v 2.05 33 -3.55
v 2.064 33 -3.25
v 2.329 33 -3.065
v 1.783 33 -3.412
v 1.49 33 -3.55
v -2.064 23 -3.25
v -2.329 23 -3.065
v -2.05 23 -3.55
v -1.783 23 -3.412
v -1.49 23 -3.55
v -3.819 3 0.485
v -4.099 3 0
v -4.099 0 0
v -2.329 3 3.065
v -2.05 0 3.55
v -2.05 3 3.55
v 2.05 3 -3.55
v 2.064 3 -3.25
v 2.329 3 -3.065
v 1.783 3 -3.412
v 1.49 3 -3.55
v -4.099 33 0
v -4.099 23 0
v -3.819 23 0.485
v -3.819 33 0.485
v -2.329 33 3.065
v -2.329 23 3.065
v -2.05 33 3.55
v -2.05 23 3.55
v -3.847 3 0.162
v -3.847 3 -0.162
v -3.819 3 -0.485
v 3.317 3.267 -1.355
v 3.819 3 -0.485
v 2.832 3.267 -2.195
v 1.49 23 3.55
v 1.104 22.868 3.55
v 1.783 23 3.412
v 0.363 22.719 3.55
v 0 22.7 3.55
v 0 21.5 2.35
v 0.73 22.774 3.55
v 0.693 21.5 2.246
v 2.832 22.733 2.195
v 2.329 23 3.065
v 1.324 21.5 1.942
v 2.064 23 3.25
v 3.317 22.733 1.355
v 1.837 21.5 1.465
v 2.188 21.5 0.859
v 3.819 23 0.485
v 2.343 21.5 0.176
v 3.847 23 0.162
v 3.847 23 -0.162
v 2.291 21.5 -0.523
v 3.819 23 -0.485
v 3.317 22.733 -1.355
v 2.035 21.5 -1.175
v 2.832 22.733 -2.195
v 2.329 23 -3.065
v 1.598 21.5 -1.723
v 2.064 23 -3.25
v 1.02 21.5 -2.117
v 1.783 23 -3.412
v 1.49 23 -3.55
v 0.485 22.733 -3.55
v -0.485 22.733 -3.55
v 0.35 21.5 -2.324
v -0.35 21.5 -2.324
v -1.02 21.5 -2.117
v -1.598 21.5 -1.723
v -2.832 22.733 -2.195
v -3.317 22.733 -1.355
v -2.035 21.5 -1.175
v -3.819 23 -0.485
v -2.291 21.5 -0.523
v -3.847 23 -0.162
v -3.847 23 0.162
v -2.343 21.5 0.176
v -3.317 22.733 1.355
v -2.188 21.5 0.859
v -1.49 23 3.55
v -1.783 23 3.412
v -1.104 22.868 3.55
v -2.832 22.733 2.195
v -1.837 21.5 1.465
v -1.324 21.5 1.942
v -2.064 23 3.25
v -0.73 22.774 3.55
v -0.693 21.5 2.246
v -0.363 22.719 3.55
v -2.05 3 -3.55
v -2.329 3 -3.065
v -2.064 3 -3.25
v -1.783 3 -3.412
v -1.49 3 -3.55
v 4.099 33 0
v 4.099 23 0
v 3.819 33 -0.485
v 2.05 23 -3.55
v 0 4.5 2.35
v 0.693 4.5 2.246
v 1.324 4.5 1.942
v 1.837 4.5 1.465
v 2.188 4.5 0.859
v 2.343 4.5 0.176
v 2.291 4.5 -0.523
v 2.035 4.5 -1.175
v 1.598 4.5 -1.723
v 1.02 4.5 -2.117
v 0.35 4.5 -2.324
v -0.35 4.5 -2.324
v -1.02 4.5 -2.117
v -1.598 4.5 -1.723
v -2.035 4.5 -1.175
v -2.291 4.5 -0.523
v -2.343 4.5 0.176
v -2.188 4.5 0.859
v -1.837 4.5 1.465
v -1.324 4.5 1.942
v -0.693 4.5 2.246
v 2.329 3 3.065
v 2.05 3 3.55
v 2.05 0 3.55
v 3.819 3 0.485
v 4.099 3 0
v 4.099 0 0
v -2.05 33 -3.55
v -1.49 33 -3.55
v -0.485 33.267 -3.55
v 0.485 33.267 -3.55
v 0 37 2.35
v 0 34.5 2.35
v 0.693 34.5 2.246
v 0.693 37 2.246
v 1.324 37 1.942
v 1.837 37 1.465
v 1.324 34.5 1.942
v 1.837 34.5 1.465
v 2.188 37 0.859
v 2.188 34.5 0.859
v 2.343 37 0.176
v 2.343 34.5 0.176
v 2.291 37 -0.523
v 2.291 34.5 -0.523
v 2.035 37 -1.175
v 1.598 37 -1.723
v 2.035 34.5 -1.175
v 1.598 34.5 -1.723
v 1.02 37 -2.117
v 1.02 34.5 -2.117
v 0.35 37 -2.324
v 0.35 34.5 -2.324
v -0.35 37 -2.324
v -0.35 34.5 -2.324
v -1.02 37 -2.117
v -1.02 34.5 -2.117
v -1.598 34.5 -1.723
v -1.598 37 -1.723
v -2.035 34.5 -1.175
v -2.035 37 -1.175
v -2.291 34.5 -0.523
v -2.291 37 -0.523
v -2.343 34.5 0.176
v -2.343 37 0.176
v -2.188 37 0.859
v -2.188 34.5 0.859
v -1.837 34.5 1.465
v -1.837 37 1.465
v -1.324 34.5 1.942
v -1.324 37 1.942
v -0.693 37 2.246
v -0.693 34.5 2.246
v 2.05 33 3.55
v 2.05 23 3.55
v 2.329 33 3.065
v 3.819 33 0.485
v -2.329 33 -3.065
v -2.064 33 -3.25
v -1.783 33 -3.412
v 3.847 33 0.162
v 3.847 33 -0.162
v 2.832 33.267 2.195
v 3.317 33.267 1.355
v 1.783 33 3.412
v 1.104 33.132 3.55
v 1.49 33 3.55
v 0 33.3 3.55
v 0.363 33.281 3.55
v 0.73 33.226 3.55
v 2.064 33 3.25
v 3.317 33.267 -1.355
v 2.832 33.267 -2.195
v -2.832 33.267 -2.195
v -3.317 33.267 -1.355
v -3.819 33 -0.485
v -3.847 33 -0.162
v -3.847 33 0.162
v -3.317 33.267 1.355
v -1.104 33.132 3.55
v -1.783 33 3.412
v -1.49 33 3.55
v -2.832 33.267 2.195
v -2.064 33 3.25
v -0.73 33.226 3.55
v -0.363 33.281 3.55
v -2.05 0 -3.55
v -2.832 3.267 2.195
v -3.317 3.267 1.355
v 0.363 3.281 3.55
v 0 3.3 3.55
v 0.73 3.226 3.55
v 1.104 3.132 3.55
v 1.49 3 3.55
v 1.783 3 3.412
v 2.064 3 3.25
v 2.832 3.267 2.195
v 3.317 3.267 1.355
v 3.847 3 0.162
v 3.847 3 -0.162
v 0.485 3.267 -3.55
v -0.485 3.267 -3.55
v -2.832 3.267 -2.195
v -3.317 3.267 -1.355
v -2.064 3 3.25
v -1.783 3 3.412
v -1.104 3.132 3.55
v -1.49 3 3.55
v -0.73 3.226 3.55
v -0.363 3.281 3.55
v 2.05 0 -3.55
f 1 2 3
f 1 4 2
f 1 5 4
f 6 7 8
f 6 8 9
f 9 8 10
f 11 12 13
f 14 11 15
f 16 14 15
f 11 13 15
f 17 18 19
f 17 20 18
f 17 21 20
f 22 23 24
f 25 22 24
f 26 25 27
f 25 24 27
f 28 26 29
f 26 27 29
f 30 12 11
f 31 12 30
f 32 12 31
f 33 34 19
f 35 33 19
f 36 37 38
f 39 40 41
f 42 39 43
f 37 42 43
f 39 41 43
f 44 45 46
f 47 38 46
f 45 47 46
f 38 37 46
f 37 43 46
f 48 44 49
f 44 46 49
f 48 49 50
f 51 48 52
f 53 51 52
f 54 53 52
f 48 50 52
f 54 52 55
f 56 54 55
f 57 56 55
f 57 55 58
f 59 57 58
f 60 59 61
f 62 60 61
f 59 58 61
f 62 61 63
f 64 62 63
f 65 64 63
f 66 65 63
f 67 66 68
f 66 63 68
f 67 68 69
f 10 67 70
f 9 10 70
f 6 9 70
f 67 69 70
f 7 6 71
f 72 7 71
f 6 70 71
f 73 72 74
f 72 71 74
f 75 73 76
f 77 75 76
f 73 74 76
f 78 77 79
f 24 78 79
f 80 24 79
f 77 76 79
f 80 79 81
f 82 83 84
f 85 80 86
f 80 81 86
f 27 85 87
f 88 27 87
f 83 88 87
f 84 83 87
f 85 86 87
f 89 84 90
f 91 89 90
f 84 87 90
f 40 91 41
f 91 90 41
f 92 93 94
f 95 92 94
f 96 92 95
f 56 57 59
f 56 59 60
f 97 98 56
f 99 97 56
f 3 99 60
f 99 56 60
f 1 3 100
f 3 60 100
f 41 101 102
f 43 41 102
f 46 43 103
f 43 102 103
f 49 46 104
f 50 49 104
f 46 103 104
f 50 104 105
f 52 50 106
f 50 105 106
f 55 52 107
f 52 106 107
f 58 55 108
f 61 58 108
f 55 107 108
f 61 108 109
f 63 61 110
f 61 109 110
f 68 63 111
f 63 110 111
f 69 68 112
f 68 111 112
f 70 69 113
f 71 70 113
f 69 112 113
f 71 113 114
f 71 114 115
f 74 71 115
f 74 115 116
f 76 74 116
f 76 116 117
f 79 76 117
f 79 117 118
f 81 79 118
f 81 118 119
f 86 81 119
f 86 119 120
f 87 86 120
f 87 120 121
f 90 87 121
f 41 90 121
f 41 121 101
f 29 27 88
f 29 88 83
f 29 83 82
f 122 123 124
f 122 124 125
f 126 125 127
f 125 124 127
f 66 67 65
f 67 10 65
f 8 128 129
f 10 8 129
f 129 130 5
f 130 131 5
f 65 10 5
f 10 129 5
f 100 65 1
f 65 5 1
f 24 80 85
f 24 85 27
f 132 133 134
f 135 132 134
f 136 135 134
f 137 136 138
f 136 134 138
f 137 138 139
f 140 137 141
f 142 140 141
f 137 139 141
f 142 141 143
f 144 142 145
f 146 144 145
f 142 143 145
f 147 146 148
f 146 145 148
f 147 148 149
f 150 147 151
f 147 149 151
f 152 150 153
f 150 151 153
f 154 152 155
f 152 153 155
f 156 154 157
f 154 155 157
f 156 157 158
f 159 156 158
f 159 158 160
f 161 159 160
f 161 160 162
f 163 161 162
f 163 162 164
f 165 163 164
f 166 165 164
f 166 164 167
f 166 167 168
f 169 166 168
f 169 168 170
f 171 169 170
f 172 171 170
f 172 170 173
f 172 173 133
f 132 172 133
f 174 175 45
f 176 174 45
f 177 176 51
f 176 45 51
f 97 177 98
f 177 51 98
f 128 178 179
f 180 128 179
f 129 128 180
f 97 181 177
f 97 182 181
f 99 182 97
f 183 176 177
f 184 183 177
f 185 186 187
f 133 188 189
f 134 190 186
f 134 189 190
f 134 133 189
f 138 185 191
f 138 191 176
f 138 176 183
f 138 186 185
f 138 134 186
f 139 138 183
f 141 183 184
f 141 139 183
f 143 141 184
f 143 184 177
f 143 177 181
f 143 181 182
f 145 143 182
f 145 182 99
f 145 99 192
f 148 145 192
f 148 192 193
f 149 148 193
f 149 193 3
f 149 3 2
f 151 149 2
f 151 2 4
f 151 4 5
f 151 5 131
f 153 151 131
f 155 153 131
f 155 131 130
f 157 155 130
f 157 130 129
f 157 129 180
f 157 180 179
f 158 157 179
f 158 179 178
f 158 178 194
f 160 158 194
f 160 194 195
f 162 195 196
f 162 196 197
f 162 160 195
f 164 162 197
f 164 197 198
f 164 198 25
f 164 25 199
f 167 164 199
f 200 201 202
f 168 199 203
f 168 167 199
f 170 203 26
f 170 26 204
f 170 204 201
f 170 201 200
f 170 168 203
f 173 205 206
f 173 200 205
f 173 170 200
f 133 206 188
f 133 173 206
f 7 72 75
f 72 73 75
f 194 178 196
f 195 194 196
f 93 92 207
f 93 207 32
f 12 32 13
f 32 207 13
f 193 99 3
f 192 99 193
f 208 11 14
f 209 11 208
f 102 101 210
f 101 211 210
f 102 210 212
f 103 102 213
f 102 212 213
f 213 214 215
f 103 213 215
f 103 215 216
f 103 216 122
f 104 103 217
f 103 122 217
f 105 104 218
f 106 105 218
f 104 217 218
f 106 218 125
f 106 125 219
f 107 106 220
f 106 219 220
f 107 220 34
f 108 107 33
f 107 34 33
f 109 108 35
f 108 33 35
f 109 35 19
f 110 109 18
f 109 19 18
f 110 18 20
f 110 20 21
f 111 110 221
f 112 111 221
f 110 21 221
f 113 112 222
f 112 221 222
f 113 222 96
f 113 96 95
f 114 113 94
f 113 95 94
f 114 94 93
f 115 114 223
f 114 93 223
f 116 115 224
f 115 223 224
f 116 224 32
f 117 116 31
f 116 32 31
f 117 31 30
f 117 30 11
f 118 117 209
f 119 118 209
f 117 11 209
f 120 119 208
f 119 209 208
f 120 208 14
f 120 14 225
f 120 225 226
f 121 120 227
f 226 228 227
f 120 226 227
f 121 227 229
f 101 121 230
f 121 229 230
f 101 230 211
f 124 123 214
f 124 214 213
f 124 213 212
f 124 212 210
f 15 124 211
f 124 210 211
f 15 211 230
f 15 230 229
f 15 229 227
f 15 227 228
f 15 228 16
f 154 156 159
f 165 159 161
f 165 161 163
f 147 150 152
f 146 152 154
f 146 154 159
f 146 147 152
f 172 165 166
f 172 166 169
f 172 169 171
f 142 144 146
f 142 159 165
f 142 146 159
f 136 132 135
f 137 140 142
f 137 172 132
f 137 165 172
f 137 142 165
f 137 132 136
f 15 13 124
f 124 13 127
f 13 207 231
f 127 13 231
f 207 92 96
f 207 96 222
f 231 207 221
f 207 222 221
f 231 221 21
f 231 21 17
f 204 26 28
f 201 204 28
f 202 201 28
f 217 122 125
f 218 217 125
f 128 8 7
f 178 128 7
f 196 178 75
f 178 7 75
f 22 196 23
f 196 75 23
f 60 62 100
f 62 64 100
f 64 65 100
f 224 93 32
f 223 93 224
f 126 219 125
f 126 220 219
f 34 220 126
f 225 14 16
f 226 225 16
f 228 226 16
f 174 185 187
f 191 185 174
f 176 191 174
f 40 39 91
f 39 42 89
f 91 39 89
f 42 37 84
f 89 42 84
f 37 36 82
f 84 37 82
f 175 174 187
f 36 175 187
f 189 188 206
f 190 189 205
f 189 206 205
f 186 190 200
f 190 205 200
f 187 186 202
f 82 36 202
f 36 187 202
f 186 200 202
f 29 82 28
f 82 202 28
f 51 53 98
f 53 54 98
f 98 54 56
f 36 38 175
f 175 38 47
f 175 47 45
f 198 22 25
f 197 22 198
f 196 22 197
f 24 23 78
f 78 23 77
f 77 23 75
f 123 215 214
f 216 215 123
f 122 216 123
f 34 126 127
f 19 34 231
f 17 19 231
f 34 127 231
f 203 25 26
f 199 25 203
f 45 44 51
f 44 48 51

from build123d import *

# Parameters (mm, degrees)
BOSS_EXTRUDE1_DEPTH = 3
SKETCH2_R           = 2.35
BOSS_EXTRUDE2_DEPTH = 20
BOSS_EXTRUDE3_START = 23
BOSS_EXTRUDE3_DEPTH = 10
BOSS_EXTRUDE4_START = 30
SKETCH2_2_R         = 2.35
BOSS_EXTRUDE4_DEPTH = 4
CHAMFER1_SIZE       = 1.5


with BuildPart() as part:
    # Sketch1 → Boss-Extrude1 (new body)
    with BuildSketch(Plane(origin=(0, 0, 0), x_dir=(1, 0, 0), z_dir=(0, 1, 0))):
        Polygon((2.049593456, -3.55), (4.099186911, 0), (2.049593456, 3.55), (-2.049593456, 3.55), (-4.099186911, 0), (-2.049593456, -3.55), align=None)
    extrude(amount=BOSS_EXTRUDE1_DEPTH)

    # Sketch2 → Boss-Extrude2 (add)
    with BuildSketch(Plane(origin=(0, 3, 0), x_dir=(1, 0, 0), z_dir=(0, 1, 0))):
        with Locations(Location((0, 0, 0), (0, 0, 270))):
            Circle(SKETCH2_R)
    extrude(amount=BOSS_EXTRUDE2_DEPTH)

    # Sketch1<2> → Boss-Extrude3 (add)
    with BuildSketch(Plane(origin=(0, 0, 0), x_dir=(1, 0, 0), z_dir=(0, 1, 0)).offset(BOSS_EXTRUDE3_START)):
        Polygon((2.049593456, -3.55), (4.099186911, 0), (2.049593456, 3.55), (-2.049593456, 3.55), (-4.099186911, 0), (-2.049593456, -3.55), align=None)
    extrude(amount=BOSS_EXTRUDE3_DEPTH)

    # Sketch2<2> → Boss-Extrude4 (add)
    with BuildSketch(Plane(origin=(0, 3, 0), x_dir=(1, 0, 0), z_dir=(0, 1, 0)).offset(BOSS_EXTRUDE4_START)):
        with Locations(Location((0, 0, 0), (0, 0, 270))):
            Circle(SKETCH2_2_R)
    extrude(amount=BOSS_EXTRUDE4_DEPTH)

    # Chamfer1
    # the kernel refuses this chamfer: 1.5 mm, written as the material it adds along each edge
    with BuildSketch(Plane(origin=(0, 3, 0), x_dir=(0, 0, 1), z_dir=(-1, 0, 0))) as chamfer1_piece_1_section:
        Polygon((2.35, CHAMFER1_SIZE), (2.35 + CHAMFER1_SIZE, 0), (2.35, 0), align=None)
    chamfer1_piece_1 = revolve(axis=Axis((0, 3, 0), (0, 1, 0)), mode=Mode.PRIVATE)
    chamfer1_piece_1 = split(chamfer1_piece_1, bisect_by=Plane(origin=(4.408223306, 3.730355649, -0.535266737), z_dir=(-0.8660254037844387, 0, -0.5)), keep=Keep.TOP, mode=Mode.PRIVATE)
    chamfer1_piece_1 = split(chamfer1_piece_1, bisect_by=Plane(origin=(0, 3.730355649, 3.55), z_dir=(0, 0, -1)), keep=Keep.TOP, mode=Mode.PRIVATE)
    chamfer1_piece_1 = split(chamfer1_piece_1, bisect_by=Plane(origin=(1.740557061, 3.730355649, -4.085266737), z_dir=(-0.8660254037844387, 0, 0.5000000000000003)), keep=Keep.TOP, mode=Mode.PRIVATE)
    chamfer1_piece_1 = split(chamfer1_piece_1, bisect_by=Plane(origin=(-4.408223306, 3.730355649, -0.535266737), z_dir=(0.8660254037844387, 0, -0.5000000000000003)), keep=Keep.TOP, mode=Mode.PRIVATE)
    chamfer1_piece_1 = split(chamfer1_piece_1, bisect_by=Plane(origin=(0, 3.730355649, -3.55), z_dir=(0, 0, 1)), keep=Keep.TOP, mode=Mode.PRIVATE)
    chamfer1_piece_1 = split(chamfer1_piece_1, bisect_by=Plane(origin=(-1.740557061, 3.730355649, -4.085266737), z_dir=(0.8660254037844386, 0, 0.5000000000000002)), keep=Keep.TOP, mode=Mode.PRIVATE)
    add(chamfer1_piece_1)
    with BuildSketch(Plane(origin=(0, 23, 0), x_dir=(0, 0, 1), z_dir=(-1, 0, 0))) as chamfer1_piece_2_section:
        Polygon((2.35 + CHAMFER1_SIZE, 0), (2.35, -CHAMFER1_SIZE), (2.35, 0), align=None)
    chamfer1_piece_2 = revolve(axis=Axis((0, 23, 0), (0, 1, 0)), mode=Mode.PRIVATE)
    chamfer1_piece_2 = split(chamfer1_piece_2, bisect_by=Plane(origin=(4.408223304, 22.269644356, -0.535266733), z_dir=(-0.8660254037844387, 0, -0.5)), keep=Keep.TOP, mode=Mode.PRIVATE)
    chamfer1_piece_2 = split(chamfer1_piece_2, bisect_by=Plane(origin=(0, 22.269644356, 3.55), z_dir=(0, 0, -1)), keep=Keep.TOP, mode=Mode.PRIVATE)
    chamfer1_piece_2 = split(chamfer1_piece_2, bisect_by=Plane(origin=(1.740557063, 22.269644356, -4.085266733), z_dir=(-0.8660254037844387, 0, 0.5000000000000003)), keep=Keep.TOP, mode=Mode.PRIVATE)
    chamfer1_piece_2 = split(chamfer1_piece_2, bisect_by=Plane(origin=(-4.408223304, 22.269644356, -0.535266733), z_dir=(0.8660254037844387, 0, -0.5000000000000003)), keep=Keep.TOP, mode=Mode.PRIVATE)
    chamfer1_piece_2 = split(chamfer1_piece_2, bisect_by=Plane(origin=(0, 22.269644356, -3.55), z_dir=(0, 0, 1)), keep=Keep.TOP, mode=Mode.PRIVATE)
    chamfer1_piece_2 = split(chamfer1_piece_2, bisect_by=Plane(origin=(-1.740557063, 22.269644356, -4.085266733), z_dir=(0.8660254037844386, 0, 0.5000000000000002)), keep=Keep.TOP, mode=Mode.PRIVATE)
    add(chamfer1_piece_2)
    with BuildSketch(Plane(origin=(0, 33, 0), x_dir=(0, 0, 1), z_dir=(-1, 0, 0))) as chamfer1_piece_3_section:
        Polygon((2.35 + CHAMFER1_SIZE, 0), (2.35, CHAMFER1_SIZE), (2.35, 0), align=None)
    chamfer1_piece_3 = revolve(axis=Axis((0, 33, 0), (0, 1, 0)), mode=Mode.PRIVATE)
    chamfer1_piece_3 = split(chamfer1_piece_3, bisect_by=Plane(origin=(4.408223304, 33.730355644, -0.535266733), z_dir=(-0.8660254037844387, 0, -0.5)), keep=Keep.TOP, mode=Mode.PRIVATE)
    chamfer1_piece_3 = split(chamfer1_piece_3, bisect_by=Plane(origin=(0, 33.730355644, 3.55), z_dir=(0, 0, -1)), keep=Keep.TOP, mode=Mode.PRIVATE)
    chamfer1_piece_3 = split(chamfer1_piece_3, bisect_by=Plane(origin=(1.740557063, 33.730355644, -4.085266733), z_dir=(-0.8660254037844387, 0, 0.5000000000000003)), keep=Keep.TOP, mode=Mode.PRIVATE)
    chamfer1_piece_3 = split(chamfer1_piece_3, bisect_by=Plane(origin=(-4.408223304, 33.730355644, -0.535266733), z_dir=(0.8660254037844387, 0, -0.5000000000000003)), keep=Keep.TOP, mode=Mode.PRIVATE)
    chamfer1_piece_3 = split(chamfer1_piece_3, bisect_by=Plane(origin=(0, 33.730355644, -3.55), z_dir=(0, 0, 1)), keep=Keep.TOP, mode=Mode.PRIVATE)
    chamfer1_piece_3 = split(chamfer1_piece_3, bisect_by=Plane(origin=(-1.740557063, 33.730355644, -4.085266733), z_dir=(0.8660254037844386, 0, 0.5000000000000002)), keep=Keep.TOP, mode=Mode.PRIVATE)
    add(chamfer1_piece_3)


solid = part.part
